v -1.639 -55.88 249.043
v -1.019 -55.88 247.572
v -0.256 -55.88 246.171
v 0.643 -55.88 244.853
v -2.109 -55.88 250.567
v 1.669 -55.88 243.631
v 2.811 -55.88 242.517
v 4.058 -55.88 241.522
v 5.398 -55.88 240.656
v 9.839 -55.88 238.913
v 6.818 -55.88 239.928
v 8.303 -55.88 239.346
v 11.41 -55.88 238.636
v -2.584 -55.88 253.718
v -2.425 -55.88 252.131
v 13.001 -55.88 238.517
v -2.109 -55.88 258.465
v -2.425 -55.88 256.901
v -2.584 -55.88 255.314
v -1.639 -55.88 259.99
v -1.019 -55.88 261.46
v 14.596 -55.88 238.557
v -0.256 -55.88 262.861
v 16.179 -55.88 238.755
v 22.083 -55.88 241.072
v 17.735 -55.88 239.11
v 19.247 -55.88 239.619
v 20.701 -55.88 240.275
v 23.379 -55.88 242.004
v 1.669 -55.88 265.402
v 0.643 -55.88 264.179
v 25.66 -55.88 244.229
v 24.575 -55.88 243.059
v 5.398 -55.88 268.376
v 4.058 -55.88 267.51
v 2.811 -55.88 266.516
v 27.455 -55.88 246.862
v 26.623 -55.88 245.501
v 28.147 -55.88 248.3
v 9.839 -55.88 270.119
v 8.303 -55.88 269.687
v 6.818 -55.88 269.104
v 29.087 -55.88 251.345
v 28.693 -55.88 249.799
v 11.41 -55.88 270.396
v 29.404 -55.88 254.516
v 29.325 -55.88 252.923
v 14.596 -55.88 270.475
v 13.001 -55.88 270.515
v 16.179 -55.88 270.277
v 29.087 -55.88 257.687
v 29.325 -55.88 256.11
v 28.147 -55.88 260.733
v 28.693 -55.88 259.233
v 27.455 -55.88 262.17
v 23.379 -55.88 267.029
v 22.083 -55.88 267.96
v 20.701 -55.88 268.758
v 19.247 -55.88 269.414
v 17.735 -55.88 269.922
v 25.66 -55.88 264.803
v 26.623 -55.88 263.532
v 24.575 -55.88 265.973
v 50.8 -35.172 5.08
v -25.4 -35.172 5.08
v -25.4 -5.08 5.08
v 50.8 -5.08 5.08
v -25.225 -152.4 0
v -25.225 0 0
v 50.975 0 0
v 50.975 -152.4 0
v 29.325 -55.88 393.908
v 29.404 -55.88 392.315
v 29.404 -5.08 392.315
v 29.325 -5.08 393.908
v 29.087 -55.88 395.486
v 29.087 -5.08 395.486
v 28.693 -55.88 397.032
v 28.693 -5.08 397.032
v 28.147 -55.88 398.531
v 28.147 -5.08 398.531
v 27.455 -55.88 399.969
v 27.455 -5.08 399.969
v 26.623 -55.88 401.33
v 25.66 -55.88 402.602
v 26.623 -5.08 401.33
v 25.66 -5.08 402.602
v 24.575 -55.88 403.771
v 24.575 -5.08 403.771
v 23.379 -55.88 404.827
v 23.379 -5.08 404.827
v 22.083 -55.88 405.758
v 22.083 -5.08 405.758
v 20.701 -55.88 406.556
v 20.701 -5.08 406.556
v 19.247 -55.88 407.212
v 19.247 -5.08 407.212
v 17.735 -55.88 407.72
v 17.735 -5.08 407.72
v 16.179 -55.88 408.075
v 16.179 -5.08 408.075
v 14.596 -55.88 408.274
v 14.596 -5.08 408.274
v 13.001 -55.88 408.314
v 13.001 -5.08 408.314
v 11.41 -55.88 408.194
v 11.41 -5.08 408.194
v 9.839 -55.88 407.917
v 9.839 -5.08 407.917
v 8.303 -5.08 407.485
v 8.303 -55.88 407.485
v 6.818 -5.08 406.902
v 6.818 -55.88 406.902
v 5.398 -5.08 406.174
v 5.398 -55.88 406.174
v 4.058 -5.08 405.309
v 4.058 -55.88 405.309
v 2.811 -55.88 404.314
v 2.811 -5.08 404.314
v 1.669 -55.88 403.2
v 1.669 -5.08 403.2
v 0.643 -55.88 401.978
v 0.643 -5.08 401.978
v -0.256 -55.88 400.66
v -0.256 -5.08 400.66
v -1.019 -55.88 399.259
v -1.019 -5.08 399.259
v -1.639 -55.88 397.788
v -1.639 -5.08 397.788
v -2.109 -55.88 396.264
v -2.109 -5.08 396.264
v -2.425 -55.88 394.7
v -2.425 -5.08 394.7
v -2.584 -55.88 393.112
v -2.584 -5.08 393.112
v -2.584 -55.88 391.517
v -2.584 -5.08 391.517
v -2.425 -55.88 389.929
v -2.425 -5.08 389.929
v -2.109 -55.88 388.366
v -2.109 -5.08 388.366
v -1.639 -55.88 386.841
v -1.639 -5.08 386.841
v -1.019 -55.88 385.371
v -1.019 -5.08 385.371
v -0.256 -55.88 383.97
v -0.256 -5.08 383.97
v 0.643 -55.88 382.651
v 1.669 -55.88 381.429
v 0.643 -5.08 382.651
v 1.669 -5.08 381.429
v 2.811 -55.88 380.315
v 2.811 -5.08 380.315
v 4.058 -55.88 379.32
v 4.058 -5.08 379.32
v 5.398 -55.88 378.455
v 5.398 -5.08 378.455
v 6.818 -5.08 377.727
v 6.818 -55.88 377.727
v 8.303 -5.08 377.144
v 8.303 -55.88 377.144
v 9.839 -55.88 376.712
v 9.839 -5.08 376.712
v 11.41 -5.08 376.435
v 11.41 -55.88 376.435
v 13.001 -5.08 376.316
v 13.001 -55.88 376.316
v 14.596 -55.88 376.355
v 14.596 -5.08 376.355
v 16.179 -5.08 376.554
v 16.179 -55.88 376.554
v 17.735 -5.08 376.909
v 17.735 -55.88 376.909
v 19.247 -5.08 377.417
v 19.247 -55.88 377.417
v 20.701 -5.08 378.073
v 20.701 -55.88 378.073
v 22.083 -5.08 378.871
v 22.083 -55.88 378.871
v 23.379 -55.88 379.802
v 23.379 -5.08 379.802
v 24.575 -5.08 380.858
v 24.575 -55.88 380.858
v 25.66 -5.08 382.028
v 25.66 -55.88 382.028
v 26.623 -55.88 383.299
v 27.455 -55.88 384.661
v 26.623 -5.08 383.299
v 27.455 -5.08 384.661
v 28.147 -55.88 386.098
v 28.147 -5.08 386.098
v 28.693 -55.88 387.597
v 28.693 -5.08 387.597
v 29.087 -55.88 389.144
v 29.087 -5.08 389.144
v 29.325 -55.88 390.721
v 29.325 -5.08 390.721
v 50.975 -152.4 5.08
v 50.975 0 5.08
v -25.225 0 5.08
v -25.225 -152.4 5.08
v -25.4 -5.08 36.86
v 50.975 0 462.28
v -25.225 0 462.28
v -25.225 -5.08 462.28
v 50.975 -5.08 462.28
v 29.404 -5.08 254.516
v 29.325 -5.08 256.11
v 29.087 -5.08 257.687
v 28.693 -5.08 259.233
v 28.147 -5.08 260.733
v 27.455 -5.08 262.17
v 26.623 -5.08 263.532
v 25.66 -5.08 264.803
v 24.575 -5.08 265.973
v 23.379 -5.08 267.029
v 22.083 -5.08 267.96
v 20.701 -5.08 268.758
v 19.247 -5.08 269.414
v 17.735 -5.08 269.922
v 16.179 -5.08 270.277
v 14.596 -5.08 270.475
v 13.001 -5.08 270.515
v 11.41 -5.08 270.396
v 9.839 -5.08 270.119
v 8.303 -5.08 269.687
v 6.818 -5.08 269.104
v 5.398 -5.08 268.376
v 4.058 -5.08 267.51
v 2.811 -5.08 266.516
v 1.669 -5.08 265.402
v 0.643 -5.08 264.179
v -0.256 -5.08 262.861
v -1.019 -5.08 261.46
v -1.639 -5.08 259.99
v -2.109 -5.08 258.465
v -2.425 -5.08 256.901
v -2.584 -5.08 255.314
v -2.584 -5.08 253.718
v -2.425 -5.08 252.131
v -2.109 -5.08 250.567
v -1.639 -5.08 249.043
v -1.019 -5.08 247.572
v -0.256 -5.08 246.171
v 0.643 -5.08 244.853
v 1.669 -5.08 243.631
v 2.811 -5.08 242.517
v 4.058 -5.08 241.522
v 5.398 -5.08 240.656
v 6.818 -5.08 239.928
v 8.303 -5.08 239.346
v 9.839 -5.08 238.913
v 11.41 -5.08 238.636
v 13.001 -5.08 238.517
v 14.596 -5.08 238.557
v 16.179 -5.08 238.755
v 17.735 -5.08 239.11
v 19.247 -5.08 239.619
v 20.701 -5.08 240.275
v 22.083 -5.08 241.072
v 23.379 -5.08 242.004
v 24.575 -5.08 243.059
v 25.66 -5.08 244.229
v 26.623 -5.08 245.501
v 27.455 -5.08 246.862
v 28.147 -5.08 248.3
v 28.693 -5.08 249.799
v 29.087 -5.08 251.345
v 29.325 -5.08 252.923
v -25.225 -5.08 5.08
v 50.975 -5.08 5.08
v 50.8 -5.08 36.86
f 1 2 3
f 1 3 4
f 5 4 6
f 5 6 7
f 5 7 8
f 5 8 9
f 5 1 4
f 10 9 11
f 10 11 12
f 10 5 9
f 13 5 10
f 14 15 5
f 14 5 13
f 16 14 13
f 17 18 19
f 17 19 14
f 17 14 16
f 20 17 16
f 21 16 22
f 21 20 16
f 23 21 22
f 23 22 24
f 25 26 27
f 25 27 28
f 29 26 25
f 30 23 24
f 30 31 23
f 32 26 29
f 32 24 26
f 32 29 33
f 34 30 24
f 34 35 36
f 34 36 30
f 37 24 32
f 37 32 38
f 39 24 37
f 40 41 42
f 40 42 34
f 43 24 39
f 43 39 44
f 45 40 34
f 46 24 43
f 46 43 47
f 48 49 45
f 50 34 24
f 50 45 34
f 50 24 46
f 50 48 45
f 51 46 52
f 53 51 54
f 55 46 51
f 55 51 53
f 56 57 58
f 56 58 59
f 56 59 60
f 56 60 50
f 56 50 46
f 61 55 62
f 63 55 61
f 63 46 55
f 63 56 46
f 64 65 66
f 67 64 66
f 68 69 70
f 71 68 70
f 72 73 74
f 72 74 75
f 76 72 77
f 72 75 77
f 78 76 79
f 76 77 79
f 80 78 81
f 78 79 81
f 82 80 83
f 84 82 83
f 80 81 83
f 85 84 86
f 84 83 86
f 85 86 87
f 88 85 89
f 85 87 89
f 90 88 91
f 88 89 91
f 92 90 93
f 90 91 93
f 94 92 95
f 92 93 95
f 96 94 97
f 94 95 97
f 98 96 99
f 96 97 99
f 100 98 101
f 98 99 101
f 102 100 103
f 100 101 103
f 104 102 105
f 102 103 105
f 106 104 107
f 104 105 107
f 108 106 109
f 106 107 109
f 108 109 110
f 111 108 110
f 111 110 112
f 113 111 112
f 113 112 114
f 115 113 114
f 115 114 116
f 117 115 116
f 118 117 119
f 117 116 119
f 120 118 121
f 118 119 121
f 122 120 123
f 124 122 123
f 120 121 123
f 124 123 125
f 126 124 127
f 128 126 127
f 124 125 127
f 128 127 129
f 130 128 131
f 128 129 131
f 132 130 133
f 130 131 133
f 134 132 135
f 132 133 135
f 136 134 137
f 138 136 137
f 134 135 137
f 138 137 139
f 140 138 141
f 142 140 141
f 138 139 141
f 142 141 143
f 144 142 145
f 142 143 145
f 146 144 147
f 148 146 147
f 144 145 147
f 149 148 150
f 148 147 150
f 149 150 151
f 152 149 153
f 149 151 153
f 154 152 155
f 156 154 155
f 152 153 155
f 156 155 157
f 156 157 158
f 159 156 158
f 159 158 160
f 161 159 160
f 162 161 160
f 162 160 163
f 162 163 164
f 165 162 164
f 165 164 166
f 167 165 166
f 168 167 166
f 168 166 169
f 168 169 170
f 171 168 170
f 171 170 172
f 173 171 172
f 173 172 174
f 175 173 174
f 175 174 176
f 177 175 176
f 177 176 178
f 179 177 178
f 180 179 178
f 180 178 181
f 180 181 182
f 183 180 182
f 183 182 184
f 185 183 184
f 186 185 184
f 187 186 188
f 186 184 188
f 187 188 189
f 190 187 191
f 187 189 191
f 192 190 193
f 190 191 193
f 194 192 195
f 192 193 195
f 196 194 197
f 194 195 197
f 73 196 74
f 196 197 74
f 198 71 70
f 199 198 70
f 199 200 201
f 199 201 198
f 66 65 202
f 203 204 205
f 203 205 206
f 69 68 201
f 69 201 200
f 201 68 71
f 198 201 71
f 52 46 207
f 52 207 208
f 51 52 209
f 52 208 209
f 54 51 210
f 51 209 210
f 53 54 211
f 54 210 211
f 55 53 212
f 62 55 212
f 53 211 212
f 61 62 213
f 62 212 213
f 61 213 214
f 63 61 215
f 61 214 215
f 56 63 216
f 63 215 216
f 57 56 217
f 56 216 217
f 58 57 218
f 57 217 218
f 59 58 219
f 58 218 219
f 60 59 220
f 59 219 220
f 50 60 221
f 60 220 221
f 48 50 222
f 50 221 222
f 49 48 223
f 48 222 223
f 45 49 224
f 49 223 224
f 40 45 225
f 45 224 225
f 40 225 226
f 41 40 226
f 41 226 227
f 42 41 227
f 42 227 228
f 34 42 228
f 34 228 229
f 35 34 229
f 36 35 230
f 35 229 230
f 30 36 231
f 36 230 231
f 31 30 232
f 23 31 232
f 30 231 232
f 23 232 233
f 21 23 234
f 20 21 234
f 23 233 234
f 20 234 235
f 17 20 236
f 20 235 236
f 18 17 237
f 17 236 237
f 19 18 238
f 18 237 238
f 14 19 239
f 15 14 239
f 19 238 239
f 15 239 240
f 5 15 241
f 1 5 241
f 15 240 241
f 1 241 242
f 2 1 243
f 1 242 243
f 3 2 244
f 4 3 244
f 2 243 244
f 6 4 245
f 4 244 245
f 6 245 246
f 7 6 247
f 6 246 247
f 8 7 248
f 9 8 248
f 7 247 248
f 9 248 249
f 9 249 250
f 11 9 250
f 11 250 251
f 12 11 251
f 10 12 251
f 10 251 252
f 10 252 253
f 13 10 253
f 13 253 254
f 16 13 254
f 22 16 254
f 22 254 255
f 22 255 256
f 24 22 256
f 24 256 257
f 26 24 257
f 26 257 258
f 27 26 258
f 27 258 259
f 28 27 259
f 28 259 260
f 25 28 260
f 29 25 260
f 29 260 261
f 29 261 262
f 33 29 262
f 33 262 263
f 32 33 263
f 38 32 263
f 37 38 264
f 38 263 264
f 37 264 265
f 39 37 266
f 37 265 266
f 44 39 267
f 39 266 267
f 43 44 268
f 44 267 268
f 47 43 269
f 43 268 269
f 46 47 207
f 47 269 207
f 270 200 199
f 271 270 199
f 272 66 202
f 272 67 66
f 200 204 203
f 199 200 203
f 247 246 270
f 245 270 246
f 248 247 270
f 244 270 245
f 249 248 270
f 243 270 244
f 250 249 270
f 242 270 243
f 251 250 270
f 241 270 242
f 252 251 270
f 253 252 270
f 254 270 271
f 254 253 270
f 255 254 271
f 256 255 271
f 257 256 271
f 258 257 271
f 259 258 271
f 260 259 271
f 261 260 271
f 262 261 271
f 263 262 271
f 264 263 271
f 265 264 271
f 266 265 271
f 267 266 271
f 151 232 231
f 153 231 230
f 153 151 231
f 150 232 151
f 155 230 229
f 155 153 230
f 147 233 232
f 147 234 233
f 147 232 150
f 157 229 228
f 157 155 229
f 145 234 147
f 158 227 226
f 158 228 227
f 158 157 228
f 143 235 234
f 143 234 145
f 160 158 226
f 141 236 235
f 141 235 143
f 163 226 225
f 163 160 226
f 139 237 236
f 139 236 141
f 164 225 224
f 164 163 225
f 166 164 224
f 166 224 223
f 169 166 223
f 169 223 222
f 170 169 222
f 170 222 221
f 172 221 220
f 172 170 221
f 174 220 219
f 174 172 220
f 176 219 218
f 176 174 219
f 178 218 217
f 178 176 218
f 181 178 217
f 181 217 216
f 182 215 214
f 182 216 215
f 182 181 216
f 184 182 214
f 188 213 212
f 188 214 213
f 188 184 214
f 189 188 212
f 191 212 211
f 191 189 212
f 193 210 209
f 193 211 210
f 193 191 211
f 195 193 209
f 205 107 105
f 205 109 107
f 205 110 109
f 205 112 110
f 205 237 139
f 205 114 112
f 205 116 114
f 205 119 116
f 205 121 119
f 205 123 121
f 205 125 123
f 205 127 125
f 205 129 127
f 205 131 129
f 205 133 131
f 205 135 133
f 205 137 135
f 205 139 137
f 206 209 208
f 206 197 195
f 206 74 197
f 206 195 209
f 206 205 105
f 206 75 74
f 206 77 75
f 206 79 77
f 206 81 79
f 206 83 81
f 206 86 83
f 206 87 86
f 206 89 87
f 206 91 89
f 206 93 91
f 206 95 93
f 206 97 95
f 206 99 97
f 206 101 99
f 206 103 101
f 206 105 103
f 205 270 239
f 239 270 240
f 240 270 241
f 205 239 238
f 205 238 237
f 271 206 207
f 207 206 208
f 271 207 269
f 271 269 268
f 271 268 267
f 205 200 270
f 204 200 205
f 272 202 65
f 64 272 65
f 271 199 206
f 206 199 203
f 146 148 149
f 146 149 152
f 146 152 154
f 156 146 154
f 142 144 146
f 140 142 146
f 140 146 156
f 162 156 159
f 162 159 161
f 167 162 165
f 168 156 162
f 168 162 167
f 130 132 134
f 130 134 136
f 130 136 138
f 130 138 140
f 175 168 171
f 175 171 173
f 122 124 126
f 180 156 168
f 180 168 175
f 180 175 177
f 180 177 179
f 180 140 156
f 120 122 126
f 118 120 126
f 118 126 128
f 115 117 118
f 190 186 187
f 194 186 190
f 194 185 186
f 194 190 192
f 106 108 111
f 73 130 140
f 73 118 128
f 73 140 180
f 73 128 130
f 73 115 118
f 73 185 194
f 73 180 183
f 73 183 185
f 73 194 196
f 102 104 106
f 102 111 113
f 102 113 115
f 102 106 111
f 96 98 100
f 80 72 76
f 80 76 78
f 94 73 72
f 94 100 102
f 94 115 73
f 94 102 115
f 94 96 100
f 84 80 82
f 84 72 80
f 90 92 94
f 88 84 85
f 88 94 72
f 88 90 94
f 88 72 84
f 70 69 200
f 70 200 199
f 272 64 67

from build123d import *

# Parameters (mm, degrees)
F0_W          = 76.2
F0_H          = 152.4
F1_DEPTH      = 5.08
F2_W          = 76.2
F2_H          = 457.2
F3_DEPTH      = 5.08
F5_DEPTH      = 50.8
F5_DEPTH_BACK = 25.4
F6_R          = 16.003945
F7_DEPTH      = 50.8


with BuildPart() as f1:
    # F0 (on Top) → F1 (new body)
    with BuildSketch(Plane.XY):
        with Locations((12.875189, -76.2)):
            Rectangle(F0_W, F0_H)
    extrude(amount=F1_DEPTH)


with BuildPart() as f3:
    # F2 (on Front) → F3 (new body)
    with BuildSketch(Plane.XZ):
        with Locations((12.875189, 233.68)):
            Rectangle(F2_W, F2_H)
    extrude(amount=F3_DEPTH)

    # F6 (on face) → F7 (join)
    with BuildSketch(Plane.XZ.offset(5.08)):
        with Locations((13.400241, 392.314672)):
            Circle(F6_R)
        with Locations((13.400241, 254.516184)):
            Circle(F6_R)
    extrude(amount=F7_DEPTH)


with BuildPart() as f5:
    # F4 (on Right) → F5 (new body, two sides)
    with BuildSketch(Plane.YZ) as f5_sk:
        Polygon((-5.08, 5.08), (-5.08, 36.859853), (-35.172426, 5.08), align=None)
    extrude(amount=F5_DEPTH)
    extrude(f5_sk.sketch, amount=-F5_DEPTH_BACK)


solid = Compound([f1.part, f3.part, f5.part])
